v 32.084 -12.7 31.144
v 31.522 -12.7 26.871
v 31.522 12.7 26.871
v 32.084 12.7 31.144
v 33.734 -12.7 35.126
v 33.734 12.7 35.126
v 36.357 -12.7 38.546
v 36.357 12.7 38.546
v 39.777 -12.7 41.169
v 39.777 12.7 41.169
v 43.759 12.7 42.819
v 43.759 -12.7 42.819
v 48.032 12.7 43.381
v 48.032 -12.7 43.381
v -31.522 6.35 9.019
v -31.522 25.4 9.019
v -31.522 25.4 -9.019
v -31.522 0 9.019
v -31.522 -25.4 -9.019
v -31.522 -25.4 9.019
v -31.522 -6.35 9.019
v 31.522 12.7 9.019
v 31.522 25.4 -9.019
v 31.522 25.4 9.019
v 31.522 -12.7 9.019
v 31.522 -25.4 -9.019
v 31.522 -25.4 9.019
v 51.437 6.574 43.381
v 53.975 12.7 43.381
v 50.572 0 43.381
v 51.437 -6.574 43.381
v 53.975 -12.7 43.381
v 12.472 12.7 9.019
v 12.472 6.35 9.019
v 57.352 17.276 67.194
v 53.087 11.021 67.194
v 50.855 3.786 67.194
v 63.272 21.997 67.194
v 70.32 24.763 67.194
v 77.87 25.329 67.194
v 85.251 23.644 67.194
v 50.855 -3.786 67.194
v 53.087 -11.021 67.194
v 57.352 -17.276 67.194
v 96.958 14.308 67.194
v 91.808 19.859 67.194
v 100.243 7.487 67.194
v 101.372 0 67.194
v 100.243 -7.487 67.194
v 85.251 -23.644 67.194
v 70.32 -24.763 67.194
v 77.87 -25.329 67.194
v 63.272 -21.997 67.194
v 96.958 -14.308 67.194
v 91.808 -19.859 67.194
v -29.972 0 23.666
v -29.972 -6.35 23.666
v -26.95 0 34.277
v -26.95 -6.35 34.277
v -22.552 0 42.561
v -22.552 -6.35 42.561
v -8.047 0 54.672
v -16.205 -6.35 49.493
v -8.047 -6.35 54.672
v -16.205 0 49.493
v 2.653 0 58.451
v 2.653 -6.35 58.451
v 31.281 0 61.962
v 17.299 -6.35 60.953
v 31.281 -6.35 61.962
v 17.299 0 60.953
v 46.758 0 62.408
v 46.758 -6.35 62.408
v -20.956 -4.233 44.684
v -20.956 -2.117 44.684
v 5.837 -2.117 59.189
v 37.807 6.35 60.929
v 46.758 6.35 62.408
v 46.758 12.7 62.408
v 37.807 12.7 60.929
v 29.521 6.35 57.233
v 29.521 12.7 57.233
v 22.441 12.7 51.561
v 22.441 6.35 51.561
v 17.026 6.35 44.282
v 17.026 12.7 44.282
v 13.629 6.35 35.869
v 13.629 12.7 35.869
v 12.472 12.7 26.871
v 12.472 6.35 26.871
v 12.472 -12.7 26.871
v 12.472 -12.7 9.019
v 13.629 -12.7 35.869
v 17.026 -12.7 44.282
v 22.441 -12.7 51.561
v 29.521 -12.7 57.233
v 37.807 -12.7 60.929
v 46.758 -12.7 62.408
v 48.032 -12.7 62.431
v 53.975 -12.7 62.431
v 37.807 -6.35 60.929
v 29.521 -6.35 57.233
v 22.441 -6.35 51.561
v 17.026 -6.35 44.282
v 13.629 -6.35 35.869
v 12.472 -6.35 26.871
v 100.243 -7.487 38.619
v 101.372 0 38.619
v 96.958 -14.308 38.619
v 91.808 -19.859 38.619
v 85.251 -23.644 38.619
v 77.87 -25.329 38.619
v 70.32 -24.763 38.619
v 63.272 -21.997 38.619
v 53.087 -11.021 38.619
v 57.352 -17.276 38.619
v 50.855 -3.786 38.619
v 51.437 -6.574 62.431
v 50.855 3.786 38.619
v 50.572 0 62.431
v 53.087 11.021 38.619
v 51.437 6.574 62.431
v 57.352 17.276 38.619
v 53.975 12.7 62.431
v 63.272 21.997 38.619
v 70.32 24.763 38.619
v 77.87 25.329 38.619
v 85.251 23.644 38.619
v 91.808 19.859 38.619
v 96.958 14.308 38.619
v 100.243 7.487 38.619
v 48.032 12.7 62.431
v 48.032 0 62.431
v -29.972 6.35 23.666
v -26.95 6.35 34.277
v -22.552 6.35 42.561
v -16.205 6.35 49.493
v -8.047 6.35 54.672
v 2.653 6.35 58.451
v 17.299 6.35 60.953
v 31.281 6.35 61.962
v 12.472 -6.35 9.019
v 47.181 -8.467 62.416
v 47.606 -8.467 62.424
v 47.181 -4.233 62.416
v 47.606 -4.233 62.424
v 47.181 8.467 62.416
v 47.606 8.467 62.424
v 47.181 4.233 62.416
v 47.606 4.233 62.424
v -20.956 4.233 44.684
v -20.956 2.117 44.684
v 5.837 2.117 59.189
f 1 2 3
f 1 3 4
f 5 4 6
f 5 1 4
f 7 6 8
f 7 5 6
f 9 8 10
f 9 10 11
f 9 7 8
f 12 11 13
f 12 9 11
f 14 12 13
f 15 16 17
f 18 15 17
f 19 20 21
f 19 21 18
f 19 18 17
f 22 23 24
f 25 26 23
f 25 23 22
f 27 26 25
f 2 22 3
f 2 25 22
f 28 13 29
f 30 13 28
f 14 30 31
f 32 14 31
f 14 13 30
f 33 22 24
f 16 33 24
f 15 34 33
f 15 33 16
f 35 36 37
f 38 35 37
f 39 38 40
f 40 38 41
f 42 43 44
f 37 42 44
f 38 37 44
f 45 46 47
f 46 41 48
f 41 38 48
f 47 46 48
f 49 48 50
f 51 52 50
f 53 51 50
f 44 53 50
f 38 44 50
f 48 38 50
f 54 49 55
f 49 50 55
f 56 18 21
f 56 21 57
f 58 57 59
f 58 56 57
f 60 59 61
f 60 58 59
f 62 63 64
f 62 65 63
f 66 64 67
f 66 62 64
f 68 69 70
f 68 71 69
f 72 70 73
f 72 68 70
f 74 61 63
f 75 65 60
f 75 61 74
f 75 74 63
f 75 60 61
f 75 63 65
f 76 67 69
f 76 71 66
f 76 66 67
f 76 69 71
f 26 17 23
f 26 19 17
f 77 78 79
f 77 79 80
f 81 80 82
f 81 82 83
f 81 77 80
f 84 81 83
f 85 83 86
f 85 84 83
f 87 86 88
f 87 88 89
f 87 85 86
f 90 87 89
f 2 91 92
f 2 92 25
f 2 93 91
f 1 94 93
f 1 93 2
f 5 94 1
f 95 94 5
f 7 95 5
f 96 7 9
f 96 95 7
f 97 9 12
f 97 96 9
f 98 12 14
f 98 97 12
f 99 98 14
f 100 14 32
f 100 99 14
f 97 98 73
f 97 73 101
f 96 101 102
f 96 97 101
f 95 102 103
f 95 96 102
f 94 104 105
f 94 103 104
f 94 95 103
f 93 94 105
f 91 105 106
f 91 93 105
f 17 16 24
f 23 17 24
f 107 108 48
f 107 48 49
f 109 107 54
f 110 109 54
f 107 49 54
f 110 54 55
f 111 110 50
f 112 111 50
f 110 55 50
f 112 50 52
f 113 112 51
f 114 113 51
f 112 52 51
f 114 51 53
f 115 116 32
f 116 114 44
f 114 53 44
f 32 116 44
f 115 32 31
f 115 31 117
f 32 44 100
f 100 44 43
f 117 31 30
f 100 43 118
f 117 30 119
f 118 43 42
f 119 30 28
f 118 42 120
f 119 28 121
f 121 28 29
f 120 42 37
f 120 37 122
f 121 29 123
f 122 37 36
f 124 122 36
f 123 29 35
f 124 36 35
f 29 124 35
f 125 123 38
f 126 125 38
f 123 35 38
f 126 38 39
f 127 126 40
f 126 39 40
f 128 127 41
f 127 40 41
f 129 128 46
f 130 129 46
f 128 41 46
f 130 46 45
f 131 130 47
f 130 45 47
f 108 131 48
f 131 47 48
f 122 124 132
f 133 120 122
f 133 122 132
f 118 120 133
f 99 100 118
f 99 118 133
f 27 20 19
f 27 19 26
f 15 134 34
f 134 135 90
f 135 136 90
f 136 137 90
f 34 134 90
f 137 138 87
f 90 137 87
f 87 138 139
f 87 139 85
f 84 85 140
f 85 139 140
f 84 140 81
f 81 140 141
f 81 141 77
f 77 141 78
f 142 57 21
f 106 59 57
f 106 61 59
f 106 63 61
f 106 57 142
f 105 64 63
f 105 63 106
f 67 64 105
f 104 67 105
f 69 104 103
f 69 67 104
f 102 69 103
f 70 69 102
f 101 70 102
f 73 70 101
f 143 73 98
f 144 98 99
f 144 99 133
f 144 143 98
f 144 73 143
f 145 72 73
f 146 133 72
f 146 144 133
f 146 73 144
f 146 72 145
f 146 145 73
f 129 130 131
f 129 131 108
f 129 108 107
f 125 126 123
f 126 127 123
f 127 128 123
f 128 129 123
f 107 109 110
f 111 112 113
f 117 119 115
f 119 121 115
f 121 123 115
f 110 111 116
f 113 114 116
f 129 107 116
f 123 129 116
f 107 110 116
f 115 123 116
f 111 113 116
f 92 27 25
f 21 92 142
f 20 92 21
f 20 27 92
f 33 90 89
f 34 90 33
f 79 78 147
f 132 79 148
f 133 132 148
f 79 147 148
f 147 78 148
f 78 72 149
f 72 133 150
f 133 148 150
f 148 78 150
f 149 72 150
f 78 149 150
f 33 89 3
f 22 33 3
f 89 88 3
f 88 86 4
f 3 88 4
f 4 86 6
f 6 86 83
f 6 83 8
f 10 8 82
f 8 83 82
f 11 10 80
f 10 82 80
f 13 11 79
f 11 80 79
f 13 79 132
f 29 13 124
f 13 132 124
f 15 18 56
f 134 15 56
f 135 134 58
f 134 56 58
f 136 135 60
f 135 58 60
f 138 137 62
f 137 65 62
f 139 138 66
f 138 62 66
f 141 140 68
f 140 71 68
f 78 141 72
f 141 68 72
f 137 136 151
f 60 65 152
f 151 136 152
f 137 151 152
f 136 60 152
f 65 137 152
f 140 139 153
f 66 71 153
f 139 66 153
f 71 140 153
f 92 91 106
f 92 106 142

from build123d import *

# Parameters (mm, degrees)
F1_DEPTH = 25.4
F0_W     = 25.4
F0_H     = 19.05
F2_DEPTH = 12.7
F4_DEPTH = 6.35


with BuildPart() as f1:
    # F0 (on Front) → F1 (new body, symmetric)
    with BuildSketch(Plane.XZ):
        Polygon((31.5217984643, -9.0189850047), (31.5217984643, 9.0189850047), (12.4717984643, 9.0189850047), (-31.5217984643, 9.0189850047), (-31.5217984643, -9.0189850047), align=None)
    extrude(amount=F1_DEPTH, both=True)

    # F0 (on Front) → F2 (join, symmetric)
    with BuildSketch(Plane.XZ):
        with BuildLine():
            Line((12.4717984643, 9.0189850047), (31.5217984643, 9.0189850047))
            Line((31.5217984643, 9.0189850047), (31.5217984643, 26.8712149953))
            ThreePointArc((31.5217984643, 26.8712149953), (36.3574655069, 38.5455479527), (48.0317984643, 43.3812149953))
            Line((48.0317984643, 43.3812149953), (50.5717984643, 43.3812149953))
            Line((50.5717984643, 43.3812149953), (50.5717984643, 62.4312149953))
            Line((50.5717984643, 62.4312149953), (48.0317984643, 62.4312149953))
            add(Edge.make_bspline(
                [(46.7575546459, 62.4083772721), (47.1808590375, 62.4161488041), (47.6056092378, 62.4237507503), (48.0317984643, 62.4312149953)],
                knots=[94.9706554632, 94.9706554632, 94.9706554632, 94.9706554632, 95.8208802759, 95.8208802759, 95.8208802759, 95.8208802759], degree=3))
            ThreePointArc((46.7575546459, 62.4083772721), (22.4405332535, 51.5613090597), (12.4717984643, 26.8712149953))
            Line((12.4717984643, 26.8712149953), (12.4717984643, 9.0189850047))
        make_face()
        with Locations((63.2717984643, 52.9062149953)):
            Rectangle(F0_W, F0_H)
    extrude(amount=F2_DEPTH, both=True)

    # F0 (on Front) → F3 (revolve)
    with BuildSketch(Plane.XZ):
        Polygon((75.9717984643, 62.4312149953), (75.9717984643, 43.3812149953), (75.9717984643, 38.6187149953), (101.3717984643, 38.6187149953), (101.3717984643, 67.1937149953), (75.9717984643, 67.1937149953), align=None)
    revolve(axis=Axis((75.9717984643, 0, 52.9062149953), (0, 0, -1)))

    # F0 (on Front) → F4 (join, symmetric)
    with BuildSketch(Plane.XZ):
        with BuildLine():
            Line((-31.5217984643, 9.0189850047), (12.4717984643, 9.0189850047))
            Line((12.4717984643, 9.0189850047), (12.4717984643, 26.8712149953))
            ThreePointArc((12.4717984643, 26.8712149953), (22.4405332535, 51.5613090597), (46.7575546459, 62.4083772721))
            add(Edge.make_bspline(
                [(-31.5217984643, 9.0189850047), (-29.7697852659, 58.5562793016), (-0.5258166747, 61.5402921774), (46.7575546459, 62.4083772721)],
                knots=[0, 0, 0, 0, 94.9706554632, 94.9706554632, 94.9706554632, 94.9706554632], degree=3))
        make_face()
    extrude(amount=F4_DEPTH, both=True)


solid = f1.part
